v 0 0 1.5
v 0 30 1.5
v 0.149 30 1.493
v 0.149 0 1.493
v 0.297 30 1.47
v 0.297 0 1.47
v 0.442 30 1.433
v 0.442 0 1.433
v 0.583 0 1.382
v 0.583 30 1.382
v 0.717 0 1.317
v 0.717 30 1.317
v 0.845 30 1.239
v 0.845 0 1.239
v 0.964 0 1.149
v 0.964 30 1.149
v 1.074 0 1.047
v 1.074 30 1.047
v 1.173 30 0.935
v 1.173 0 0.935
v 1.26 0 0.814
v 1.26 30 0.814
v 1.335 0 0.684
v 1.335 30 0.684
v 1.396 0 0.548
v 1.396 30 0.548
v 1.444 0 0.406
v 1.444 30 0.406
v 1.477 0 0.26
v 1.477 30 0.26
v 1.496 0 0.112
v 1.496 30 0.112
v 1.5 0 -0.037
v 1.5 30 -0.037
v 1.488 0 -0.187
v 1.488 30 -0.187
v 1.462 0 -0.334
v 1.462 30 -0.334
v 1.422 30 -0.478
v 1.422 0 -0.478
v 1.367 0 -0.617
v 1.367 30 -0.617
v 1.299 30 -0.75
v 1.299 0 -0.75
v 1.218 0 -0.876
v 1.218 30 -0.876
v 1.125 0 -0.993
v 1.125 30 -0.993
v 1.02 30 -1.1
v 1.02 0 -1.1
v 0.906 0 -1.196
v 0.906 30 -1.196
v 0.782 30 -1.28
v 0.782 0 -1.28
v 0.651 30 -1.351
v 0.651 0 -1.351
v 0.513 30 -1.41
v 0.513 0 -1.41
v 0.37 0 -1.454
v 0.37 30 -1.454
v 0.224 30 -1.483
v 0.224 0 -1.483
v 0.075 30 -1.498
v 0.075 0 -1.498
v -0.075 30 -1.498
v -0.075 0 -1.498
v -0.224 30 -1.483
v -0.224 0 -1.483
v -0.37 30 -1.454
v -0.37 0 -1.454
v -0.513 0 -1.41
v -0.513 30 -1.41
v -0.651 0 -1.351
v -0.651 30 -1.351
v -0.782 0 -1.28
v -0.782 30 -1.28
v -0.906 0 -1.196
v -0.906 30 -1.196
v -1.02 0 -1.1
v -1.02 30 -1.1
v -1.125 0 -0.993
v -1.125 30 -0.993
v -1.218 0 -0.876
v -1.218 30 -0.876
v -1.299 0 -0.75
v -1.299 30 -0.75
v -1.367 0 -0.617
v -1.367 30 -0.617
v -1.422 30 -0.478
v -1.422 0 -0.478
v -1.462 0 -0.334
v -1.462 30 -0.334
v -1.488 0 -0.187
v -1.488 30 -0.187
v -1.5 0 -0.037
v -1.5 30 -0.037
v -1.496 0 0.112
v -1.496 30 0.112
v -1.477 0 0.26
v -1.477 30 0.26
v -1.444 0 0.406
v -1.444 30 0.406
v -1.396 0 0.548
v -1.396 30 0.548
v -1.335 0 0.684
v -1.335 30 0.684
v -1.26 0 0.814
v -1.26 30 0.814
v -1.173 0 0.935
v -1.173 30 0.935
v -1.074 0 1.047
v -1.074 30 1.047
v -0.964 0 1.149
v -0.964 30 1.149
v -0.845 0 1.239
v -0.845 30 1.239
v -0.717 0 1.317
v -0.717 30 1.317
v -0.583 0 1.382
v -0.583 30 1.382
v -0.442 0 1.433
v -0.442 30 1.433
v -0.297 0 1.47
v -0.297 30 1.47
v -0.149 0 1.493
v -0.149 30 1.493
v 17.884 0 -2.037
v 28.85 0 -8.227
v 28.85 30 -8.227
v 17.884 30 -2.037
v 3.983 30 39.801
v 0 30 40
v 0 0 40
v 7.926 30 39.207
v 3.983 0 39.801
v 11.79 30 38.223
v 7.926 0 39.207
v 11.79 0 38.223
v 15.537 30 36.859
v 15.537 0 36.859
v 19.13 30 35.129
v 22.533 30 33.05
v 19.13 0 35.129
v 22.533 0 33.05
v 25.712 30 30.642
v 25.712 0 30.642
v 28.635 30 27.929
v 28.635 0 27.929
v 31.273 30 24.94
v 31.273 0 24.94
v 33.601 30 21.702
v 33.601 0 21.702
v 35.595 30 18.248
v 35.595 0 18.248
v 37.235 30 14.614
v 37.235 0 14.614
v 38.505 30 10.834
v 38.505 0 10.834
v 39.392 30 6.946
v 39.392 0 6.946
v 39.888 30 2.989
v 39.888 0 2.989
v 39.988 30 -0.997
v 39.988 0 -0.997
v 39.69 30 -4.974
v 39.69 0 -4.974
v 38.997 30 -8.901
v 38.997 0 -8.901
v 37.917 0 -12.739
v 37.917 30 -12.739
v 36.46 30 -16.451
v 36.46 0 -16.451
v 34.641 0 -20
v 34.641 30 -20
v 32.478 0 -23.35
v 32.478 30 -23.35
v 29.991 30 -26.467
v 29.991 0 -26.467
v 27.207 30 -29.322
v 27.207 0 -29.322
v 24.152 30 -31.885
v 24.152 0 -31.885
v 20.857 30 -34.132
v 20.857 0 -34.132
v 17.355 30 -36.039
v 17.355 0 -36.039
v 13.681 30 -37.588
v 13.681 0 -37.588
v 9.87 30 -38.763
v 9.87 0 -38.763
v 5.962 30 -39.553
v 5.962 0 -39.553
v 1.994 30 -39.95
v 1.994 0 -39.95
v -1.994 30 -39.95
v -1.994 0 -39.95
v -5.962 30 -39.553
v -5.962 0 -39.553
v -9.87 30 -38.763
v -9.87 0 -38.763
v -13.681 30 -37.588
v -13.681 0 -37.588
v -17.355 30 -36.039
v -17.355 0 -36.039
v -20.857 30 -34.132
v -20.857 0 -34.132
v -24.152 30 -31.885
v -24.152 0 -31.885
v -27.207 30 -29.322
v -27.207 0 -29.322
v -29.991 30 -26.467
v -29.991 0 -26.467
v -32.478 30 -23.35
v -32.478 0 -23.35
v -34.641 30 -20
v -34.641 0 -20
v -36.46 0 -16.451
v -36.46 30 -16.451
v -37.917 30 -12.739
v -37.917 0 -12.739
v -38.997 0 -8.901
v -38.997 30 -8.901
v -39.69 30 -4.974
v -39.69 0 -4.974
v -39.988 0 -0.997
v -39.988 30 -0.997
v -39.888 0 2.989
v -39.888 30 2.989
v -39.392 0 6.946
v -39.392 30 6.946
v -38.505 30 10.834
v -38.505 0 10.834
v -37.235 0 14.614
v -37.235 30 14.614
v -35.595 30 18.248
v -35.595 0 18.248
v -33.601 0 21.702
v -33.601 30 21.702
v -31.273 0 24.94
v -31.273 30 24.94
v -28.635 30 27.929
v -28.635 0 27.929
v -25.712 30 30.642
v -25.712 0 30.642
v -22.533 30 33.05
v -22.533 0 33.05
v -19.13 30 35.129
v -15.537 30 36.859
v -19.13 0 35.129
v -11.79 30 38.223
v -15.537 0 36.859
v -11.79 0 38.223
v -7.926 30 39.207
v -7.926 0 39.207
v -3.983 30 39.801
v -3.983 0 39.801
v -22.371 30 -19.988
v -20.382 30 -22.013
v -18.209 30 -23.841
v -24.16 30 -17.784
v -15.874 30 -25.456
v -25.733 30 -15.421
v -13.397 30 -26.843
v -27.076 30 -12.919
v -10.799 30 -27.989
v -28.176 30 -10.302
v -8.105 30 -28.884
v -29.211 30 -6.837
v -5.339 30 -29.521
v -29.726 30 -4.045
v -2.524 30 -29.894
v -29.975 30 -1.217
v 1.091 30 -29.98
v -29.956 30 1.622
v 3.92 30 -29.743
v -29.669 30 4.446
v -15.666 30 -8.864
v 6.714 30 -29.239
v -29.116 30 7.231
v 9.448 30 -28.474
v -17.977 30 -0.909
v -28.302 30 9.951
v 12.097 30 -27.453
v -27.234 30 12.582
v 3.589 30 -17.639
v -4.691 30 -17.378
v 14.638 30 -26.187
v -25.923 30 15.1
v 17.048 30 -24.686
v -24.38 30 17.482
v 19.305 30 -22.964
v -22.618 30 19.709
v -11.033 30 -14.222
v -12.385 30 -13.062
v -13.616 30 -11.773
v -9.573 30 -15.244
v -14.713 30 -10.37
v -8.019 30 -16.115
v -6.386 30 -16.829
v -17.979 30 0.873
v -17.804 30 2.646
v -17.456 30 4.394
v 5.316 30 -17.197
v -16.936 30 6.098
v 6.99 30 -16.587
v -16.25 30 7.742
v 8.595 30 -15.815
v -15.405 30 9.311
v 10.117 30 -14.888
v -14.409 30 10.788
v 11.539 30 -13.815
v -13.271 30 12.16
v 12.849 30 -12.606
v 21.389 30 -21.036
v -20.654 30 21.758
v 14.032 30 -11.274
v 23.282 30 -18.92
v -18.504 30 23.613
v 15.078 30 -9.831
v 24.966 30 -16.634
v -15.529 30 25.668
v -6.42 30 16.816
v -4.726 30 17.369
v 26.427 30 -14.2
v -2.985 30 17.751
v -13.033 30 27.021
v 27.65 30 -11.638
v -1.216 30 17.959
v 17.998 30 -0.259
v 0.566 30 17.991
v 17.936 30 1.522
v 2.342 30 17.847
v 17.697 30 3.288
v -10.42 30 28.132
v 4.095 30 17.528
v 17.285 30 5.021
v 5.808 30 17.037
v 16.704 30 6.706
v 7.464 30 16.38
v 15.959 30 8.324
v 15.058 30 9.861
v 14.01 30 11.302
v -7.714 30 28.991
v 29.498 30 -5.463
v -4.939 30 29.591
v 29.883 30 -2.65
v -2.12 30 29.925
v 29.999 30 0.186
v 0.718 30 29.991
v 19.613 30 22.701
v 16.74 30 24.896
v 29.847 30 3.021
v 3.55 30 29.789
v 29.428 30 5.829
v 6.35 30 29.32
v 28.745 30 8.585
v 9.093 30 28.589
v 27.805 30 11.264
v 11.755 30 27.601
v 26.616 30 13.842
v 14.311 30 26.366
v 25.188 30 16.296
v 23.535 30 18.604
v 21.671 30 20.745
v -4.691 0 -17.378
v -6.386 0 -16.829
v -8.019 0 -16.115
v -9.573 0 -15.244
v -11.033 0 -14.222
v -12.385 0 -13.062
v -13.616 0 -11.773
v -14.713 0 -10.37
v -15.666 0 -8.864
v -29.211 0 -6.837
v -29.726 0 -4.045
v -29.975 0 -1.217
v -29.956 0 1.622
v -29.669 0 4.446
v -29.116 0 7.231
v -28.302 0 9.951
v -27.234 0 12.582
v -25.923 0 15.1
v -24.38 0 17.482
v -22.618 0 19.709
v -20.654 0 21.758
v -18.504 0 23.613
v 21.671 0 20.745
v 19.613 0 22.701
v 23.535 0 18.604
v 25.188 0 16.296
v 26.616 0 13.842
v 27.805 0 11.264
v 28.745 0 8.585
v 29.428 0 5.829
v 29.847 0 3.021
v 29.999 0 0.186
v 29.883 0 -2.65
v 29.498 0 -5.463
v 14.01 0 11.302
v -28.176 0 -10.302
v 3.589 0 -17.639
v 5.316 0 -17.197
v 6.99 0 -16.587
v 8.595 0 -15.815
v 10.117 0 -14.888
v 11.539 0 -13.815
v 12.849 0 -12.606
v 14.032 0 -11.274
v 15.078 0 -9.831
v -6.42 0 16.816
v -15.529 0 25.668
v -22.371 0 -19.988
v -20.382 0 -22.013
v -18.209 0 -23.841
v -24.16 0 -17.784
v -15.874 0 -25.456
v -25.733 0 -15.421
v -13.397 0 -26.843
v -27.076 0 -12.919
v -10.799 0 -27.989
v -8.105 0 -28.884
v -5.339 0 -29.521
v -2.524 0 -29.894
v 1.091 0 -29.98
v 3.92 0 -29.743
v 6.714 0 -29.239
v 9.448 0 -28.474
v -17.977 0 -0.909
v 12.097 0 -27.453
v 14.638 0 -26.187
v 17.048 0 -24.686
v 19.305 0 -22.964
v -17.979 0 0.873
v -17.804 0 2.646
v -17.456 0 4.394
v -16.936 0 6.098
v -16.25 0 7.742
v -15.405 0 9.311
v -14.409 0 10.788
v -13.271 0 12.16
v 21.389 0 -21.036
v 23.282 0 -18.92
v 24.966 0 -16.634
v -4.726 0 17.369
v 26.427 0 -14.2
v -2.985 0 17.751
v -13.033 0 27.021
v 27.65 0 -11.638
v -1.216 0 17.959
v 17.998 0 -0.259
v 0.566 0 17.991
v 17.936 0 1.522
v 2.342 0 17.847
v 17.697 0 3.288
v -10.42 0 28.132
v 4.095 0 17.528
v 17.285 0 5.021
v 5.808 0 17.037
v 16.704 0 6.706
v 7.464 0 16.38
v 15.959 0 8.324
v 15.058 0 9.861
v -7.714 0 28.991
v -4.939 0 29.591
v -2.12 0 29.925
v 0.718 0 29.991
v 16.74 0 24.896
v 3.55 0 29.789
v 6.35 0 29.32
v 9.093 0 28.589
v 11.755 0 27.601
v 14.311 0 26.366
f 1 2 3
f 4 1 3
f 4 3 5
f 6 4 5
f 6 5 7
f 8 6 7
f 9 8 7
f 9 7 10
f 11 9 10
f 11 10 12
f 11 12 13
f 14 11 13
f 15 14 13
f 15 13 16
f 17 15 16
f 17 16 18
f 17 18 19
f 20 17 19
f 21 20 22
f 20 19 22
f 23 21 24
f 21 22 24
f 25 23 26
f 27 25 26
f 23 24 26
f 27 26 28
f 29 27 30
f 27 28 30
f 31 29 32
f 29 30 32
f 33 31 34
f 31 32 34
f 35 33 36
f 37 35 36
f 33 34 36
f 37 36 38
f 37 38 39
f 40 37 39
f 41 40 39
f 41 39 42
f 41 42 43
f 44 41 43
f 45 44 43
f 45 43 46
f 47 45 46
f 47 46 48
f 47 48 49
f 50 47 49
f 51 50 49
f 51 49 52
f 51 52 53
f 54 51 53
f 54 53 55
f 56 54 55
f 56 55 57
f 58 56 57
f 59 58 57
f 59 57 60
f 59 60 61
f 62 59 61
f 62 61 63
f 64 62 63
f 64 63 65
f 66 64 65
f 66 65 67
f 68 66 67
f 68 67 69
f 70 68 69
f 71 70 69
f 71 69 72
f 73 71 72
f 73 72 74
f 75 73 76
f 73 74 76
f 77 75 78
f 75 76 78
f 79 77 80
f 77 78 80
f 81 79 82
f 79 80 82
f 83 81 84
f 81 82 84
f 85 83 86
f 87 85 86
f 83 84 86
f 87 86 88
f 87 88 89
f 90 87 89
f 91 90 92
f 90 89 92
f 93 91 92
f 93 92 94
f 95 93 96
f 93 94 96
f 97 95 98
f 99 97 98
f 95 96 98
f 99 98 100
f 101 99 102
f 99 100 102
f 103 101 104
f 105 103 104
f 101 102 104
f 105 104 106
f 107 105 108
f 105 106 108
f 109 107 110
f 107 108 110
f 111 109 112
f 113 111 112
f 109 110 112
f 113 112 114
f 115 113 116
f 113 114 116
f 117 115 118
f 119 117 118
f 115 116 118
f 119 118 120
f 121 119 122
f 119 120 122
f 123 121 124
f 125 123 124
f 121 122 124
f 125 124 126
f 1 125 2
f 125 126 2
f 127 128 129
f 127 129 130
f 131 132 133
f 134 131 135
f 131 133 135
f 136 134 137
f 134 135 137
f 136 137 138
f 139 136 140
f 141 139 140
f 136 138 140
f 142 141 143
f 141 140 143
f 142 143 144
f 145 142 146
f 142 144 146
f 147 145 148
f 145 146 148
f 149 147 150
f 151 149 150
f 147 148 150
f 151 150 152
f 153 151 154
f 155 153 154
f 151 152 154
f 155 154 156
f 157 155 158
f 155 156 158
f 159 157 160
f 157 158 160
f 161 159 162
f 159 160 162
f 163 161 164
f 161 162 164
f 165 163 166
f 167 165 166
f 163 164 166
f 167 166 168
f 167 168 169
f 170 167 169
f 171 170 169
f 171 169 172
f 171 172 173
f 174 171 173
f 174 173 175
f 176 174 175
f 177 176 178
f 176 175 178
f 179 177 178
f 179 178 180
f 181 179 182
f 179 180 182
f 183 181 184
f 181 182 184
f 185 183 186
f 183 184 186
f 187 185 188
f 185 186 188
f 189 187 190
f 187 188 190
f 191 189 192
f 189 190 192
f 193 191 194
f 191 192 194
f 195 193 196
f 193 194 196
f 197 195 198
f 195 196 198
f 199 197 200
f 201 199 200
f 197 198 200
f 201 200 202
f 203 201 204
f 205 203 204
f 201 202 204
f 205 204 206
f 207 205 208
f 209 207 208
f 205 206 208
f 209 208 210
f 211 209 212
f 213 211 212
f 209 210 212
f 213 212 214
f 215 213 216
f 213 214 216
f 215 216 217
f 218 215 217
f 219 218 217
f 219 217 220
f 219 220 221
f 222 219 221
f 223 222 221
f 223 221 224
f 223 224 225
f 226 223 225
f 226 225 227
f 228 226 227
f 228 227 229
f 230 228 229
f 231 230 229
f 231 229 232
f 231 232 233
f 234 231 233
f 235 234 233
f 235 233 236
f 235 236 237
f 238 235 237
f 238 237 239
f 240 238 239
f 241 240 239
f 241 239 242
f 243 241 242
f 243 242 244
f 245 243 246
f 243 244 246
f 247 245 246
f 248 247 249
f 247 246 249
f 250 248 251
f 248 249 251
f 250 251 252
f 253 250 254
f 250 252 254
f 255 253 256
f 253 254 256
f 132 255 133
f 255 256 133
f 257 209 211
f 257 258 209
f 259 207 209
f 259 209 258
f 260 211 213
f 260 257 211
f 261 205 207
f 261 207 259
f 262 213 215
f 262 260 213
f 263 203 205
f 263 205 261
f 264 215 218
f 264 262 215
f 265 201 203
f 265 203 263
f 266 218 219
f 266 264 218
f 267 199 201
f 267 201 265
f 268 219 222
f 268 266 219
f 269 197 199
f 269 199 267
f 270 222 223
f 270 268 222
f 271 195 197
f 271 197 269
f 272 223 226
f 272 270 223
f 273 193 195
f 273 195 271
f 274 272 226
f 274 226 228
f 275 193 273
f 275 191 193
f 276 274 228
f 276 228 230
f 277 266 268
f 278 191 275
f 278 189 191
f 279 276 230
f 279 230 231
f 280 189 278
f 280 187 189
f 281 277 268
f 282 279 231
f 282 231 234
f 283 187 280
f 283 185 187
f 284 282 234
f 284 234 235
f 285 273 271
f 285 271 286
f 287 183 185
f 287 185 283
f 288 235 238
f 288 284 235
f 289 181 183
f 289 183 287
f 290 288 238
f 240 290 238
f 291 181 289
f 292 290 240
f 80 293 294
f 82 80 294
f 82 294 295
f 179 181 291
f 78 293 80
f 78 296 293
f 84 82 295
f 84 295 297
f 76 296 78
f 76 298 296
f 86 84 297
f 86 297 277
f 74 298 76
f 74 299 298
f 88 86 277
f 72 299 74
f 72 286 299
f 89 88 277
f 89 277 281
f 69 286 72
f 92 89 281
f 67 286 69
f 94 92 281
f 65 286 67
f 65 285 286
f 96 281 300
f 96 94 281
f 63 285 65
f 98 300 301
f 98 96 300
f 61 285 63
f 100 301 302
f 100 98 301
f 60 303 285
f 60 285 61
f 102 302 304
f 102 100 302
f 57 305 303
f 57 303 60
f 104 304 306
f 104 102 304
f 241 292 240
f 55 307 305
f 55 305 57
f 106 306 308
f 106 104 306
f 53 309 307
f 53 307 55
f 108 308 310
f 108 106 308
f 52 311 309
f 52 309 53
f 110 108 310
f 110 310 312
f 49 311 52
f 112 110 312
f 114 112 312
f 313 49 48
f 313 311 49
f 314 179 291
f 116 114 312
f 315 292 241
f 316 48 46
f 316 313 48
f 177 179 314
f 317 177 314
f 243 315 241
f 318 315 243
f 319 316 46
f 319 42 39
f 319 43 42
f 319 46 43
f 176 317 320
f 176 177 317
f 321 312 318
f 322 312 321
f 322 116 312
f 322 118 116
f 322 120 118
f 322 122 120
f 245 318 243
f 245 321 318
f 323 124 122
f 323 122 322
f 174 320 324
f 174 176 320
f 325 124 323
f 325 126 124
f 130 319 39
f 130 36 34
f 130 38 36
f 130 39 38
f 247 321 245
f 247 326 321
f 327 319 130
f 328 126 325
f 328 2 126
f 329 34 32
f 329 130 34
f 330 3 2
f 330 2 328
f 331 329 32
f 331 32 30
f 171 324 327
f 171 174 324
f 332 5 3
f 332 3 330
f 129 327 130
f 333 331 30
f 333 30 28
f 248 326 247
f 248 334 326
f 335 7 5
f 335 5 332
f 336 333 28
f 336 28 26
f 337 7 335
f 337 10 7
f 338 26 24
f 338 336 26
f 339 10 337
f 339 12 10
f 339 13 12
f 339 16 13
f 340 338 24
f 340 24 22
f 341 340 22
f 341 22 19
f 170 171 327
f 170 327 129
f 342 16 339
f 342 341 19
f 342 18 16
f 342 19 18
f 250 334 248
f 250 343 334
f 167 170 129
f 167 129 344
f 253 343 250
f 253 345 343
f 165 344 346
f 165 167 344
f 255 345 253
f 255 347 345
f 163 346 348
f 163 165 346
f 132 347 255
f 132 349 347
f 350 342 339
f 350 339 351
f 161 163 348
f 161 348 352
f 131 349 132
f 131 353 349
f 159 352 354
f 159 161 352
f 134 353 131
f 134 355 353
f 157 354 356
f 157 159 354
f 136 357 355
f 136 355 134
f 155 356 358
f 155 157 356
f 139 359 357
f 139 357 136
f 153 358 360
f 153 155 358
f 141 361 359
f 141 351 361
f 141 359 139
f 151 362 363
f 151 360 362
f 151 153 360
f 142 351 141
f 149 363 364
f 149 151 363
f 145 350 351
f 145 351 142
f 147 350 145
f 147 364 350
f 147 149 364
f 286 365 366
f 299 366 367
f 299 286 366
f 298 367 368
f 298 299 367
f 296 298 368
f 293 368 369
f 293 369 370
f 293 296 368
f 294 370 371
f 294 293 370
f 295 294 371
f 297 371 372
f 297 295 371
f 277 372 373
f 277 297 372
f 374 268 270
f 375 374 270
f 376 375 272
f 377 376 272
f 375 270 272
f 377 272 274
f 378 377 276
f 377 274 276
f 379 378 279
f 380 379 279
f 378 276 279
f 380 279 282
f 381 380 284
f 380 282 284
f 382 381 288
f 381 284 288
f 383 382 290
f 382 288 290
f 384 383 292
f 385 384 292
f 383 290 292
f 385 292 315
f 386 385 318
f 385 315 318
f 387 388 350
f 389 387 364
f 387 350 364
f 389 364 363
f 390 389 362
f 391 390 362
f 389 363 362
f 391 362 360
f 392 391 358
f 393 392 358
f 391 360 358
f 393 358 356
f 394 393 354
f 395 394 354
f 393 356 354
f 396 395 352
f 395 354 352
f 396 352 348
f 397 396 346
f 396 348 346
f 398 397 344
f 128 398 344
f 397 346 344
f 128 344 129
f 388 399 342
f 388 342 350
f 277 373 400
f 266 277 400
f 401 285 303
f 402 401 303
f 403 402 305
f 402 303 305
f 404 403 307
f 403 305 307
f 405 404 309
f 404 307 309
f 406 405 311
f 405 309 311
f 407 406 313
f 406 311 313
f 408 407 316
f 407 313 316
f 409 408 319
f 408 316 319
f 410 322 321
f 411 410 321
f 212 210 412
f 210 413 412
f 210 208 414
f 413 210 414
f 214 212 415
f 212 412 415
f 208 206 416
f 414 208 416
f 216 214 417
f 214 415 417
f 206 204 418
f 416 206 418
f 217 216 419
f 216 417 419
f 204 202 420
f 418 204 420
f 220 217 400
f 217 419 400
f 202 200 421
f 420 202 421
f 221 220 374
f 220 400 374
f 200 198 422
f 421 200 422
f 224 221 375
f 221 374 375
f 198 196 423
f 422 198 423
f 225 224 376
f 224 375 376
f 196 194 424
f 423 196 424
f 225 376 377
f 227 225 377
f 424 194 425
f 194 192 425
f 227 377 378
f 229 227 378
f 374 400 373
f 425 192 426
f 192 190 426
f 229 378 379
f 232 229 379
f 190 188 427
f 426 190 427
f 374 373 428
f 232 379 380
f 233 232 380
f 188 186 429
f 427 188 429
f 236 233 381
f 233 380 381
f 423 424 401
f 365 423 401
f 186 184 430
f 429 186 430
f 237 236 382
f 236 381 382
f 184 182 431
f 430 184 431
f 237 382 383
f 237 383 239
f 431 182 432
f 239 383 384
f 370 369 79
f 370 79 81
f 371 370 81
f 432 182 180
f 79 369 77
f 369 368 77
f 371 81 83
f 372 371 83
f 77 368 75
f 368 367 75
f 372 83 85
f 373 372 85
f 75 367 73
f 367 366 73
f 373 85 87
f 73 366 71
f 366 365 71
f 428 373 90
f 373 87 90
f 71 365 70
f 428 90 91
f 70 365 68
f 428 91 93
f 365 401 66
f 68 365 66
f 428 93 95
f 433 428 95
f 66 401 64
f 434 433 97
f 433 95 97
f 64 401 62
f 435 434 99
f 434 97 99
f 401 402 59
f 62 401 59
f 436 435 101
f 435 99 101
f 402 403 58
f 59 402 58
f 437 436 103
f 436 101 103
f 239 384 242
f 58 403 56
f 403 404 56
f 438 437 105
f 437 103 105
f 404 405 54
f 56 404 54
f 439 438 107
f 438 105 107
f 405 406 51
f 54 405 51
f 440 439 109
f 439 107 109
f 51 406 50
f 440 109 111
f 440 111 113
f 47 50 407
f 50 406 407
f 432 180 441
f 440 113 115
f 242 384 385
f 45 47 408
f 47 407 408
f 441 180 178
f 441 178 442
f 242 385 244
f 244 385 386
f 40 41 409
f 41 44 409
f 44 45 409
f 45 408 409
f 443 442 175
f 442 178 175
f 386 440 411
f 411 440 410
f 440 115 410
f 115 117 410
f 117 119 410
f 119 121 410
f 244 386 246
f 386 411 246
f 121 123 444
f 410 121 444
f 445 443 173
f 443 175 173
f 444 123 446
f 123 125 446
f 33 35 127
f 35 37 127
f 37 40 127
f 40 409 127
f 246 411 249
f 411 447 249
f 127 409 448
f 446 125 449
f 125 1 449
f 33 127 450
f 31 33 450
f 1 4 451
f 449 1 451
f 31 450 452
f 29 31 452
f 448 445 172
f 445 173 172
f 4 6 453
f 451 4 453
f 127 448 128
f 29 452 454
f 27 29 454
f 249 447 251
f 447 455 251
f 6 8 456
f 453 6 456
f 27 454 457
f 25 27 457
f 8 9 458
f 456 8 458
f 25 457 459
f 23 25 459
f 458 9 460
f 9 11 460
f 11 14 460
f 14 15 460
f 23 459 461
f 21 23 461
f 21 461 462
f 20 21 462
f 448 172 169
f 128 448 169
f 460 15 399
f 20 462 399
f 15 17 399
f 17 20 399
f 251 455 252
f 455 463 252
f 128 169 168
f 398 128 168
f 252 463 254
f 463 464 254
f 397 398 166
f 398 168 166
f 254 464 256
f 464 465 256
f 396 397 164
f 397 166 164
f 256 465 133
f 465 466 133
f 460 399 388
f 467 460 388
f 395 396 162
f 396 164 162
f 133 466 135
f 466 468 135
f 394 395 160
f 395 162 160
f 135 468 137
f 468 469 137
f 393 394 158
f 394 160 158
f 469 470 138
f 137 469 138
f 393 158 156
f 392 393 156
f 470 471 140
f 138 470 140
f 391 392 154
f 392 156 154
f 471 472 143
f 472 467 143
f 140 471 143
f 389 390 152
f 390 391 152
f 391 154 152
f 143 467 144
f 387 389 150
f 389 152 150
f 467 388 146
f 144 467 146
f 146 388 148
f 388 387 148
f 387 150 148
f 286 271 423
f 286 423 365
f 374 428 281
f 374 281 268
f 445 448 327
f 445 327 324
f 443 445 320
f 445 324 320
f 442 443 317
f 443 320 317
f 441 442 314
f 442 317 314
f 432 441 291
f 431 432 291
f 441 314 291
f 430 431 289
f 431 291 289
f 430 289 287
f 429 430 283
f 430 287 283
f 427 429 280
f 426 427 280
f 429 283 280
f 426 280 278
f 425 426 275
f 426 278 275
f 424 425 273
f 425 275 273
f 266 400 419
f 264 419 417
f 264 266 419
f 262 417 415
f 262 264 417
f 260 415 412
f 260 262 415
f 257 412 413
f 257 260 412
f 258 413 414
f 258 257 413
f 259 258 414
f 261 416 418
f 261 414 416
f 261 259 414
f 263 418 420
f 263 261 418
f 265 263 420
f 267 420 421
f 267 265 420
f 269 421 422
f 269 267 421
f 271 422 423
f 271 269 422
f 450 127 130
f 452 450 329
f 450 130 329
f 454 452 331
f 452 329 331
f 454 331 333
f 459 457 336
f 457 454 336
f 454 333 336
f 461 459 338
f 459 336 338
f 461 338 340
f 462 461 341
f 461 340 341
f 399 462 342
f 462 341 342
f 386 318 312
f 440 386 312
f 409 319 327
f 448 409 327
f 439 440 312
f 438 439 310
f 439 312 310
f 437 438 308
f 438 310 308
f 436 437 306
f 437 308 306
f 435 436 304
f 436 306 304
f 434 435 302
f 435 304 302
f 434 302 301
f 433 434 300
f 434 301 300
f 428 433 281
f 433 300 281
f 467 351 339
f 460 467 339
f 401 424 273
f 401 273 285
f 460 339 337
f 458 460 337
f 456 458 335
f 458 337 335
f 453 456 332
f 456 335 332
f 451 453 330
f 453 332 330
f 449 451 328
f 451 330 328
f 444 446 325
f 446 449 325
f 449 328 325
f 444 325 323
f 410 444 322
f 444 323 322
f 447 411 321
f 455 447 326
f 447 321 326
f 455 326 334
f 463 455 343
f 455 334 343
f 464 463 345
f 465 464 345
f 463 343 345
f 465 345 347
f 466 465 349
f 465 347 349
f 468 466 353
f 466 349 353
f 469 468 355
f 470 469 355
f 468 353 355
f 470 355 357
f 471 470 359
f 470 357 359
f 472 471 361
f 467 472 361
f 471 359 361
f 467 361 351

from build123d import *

# Parameters (mm, degrees)
SKETCH1_R           = 40
BOSS_EXTRUDE1_DEPTH = 30
CUT_EXTRUDE2_DEPTH  = 40
SKETCH4_R           = 1.5
CUT_EXTRUDE3_DEPTH  = 40


with BuildPart() as part:
    # Sketch1 → Boss-Extrude1 (new body)
    with BuildSketch(Plane(origin=(0, 0, 0), x_dir=(1, 0, 0), z_dir=(0, 1, 0))):
        with Locations(Location((0, 0, 0), (0, 0, 270))):
            Circle(SKETCH1_R)
    extrude(amount=BOSS_EXTRUDE1_DEPTH)

    # Sketch2 → Cut-Extrude2 (cut)
    with BuildSketch(Plane(origin=(0, 30, 0), x_dir=(1, 0, 0), z_dir=(0, 1, 0))):
        with BuildLine():
            Line((-2.524208574, 29.893617564), (-4.690828974, 17.378035664))
            ThreePointArc((-4.690828974, 17.378035664), (-11.0328045, 14.222419796), (-15.666106265, 8.864147702))
            Line((-15.666106265, 8.864147702), (-28.175793715, 10.301681829))
            ThreePointArc((-28.175793715, 10.301681829), (-18.209434961, 23.841486497), (-2.524208574, 29.893617564))
        make_face()
        with BuildLine():
            Line((1.090682544, 29.980166971), (3.589212362, 17.638524729))
            ThreePointArc((3.589212362, 17.638524729), (10.117000938, 14.887790031), (15.077948188, 9.831351812))
            Line((15.077948188, 9.831351812), (27.650496433, 11.638300864))
            ThreePointArc((27.650496433, 11.638300864), (17.04757623, 24.685626277), (1.090682544, 29.980166971))
        make_face()
        with BuildLine():
            Line((28.849872599, 8.227080347), (17.884361498, 2.037060092))
            ThreePointArc((17.884361498, 2.037060092), (17.285454944, -5.021259539), (14.009513435, -11.301926089))
            Line((14.009513435, -11.301926089), (19.613155176, -22.700752059))
            ThreePointArc((19.613155176, -22.700752059), (28.745416497, -8.584930424), (28.849872599, 8.227080347))
        make_face()
        with BuildLine():
            Line((16.739519293, -24.895551688), (7.463930911, -16.379552355))
            ThreePointArc((7.463930911, -16.379552355), (0.565997728, -17.991099093), (-6.419592719, -16.816326273))
            Line((-6.419592719, -16.816326273), (-15.528899908, -25.668137207))
            ThreePointArc((-15.528899908, -25.668137207), (0.718068186, -29.99140507), (16.739519293, -24.895551688))
        make_face()
        with BuildLine():
            Line((-18.50428072, -23.613377459), (-13.271398505, -12.160180168))
            ThreePointArc((-13.271398505, -12.160180168), (-16.935649111, -6.097851195), (-17.977039929, 0.908864886))
            Line((-17.977039929, 0.908864886), (-29.210543127, 6.836970837))
            ThreePointArc((-29.210543127, 6.836970837), (-28.301625952, -9.950777279), (-18.50428072, -23.613377459))
        make_face()
    extrude(amount=-CUT_EXTRUDE2_DEPTH, mode=Mode.SUBTRACT)

    # Sketch4 → Cut-Extrude3 (cut)
    with BuildSketch(Plane(origin=(0, 30, 0), x_dir=(1, 0, 0), z_dir=(0, 1, 0))):
        with Locations(Location((0, 0, 0), (0, 0, 270))):
            Circle(SKETCH4_R)
    extrude(amount=-CUT_EXTRUDE3_DEPTH, mode=Mode.SUBTRACT)


solid = part.part
